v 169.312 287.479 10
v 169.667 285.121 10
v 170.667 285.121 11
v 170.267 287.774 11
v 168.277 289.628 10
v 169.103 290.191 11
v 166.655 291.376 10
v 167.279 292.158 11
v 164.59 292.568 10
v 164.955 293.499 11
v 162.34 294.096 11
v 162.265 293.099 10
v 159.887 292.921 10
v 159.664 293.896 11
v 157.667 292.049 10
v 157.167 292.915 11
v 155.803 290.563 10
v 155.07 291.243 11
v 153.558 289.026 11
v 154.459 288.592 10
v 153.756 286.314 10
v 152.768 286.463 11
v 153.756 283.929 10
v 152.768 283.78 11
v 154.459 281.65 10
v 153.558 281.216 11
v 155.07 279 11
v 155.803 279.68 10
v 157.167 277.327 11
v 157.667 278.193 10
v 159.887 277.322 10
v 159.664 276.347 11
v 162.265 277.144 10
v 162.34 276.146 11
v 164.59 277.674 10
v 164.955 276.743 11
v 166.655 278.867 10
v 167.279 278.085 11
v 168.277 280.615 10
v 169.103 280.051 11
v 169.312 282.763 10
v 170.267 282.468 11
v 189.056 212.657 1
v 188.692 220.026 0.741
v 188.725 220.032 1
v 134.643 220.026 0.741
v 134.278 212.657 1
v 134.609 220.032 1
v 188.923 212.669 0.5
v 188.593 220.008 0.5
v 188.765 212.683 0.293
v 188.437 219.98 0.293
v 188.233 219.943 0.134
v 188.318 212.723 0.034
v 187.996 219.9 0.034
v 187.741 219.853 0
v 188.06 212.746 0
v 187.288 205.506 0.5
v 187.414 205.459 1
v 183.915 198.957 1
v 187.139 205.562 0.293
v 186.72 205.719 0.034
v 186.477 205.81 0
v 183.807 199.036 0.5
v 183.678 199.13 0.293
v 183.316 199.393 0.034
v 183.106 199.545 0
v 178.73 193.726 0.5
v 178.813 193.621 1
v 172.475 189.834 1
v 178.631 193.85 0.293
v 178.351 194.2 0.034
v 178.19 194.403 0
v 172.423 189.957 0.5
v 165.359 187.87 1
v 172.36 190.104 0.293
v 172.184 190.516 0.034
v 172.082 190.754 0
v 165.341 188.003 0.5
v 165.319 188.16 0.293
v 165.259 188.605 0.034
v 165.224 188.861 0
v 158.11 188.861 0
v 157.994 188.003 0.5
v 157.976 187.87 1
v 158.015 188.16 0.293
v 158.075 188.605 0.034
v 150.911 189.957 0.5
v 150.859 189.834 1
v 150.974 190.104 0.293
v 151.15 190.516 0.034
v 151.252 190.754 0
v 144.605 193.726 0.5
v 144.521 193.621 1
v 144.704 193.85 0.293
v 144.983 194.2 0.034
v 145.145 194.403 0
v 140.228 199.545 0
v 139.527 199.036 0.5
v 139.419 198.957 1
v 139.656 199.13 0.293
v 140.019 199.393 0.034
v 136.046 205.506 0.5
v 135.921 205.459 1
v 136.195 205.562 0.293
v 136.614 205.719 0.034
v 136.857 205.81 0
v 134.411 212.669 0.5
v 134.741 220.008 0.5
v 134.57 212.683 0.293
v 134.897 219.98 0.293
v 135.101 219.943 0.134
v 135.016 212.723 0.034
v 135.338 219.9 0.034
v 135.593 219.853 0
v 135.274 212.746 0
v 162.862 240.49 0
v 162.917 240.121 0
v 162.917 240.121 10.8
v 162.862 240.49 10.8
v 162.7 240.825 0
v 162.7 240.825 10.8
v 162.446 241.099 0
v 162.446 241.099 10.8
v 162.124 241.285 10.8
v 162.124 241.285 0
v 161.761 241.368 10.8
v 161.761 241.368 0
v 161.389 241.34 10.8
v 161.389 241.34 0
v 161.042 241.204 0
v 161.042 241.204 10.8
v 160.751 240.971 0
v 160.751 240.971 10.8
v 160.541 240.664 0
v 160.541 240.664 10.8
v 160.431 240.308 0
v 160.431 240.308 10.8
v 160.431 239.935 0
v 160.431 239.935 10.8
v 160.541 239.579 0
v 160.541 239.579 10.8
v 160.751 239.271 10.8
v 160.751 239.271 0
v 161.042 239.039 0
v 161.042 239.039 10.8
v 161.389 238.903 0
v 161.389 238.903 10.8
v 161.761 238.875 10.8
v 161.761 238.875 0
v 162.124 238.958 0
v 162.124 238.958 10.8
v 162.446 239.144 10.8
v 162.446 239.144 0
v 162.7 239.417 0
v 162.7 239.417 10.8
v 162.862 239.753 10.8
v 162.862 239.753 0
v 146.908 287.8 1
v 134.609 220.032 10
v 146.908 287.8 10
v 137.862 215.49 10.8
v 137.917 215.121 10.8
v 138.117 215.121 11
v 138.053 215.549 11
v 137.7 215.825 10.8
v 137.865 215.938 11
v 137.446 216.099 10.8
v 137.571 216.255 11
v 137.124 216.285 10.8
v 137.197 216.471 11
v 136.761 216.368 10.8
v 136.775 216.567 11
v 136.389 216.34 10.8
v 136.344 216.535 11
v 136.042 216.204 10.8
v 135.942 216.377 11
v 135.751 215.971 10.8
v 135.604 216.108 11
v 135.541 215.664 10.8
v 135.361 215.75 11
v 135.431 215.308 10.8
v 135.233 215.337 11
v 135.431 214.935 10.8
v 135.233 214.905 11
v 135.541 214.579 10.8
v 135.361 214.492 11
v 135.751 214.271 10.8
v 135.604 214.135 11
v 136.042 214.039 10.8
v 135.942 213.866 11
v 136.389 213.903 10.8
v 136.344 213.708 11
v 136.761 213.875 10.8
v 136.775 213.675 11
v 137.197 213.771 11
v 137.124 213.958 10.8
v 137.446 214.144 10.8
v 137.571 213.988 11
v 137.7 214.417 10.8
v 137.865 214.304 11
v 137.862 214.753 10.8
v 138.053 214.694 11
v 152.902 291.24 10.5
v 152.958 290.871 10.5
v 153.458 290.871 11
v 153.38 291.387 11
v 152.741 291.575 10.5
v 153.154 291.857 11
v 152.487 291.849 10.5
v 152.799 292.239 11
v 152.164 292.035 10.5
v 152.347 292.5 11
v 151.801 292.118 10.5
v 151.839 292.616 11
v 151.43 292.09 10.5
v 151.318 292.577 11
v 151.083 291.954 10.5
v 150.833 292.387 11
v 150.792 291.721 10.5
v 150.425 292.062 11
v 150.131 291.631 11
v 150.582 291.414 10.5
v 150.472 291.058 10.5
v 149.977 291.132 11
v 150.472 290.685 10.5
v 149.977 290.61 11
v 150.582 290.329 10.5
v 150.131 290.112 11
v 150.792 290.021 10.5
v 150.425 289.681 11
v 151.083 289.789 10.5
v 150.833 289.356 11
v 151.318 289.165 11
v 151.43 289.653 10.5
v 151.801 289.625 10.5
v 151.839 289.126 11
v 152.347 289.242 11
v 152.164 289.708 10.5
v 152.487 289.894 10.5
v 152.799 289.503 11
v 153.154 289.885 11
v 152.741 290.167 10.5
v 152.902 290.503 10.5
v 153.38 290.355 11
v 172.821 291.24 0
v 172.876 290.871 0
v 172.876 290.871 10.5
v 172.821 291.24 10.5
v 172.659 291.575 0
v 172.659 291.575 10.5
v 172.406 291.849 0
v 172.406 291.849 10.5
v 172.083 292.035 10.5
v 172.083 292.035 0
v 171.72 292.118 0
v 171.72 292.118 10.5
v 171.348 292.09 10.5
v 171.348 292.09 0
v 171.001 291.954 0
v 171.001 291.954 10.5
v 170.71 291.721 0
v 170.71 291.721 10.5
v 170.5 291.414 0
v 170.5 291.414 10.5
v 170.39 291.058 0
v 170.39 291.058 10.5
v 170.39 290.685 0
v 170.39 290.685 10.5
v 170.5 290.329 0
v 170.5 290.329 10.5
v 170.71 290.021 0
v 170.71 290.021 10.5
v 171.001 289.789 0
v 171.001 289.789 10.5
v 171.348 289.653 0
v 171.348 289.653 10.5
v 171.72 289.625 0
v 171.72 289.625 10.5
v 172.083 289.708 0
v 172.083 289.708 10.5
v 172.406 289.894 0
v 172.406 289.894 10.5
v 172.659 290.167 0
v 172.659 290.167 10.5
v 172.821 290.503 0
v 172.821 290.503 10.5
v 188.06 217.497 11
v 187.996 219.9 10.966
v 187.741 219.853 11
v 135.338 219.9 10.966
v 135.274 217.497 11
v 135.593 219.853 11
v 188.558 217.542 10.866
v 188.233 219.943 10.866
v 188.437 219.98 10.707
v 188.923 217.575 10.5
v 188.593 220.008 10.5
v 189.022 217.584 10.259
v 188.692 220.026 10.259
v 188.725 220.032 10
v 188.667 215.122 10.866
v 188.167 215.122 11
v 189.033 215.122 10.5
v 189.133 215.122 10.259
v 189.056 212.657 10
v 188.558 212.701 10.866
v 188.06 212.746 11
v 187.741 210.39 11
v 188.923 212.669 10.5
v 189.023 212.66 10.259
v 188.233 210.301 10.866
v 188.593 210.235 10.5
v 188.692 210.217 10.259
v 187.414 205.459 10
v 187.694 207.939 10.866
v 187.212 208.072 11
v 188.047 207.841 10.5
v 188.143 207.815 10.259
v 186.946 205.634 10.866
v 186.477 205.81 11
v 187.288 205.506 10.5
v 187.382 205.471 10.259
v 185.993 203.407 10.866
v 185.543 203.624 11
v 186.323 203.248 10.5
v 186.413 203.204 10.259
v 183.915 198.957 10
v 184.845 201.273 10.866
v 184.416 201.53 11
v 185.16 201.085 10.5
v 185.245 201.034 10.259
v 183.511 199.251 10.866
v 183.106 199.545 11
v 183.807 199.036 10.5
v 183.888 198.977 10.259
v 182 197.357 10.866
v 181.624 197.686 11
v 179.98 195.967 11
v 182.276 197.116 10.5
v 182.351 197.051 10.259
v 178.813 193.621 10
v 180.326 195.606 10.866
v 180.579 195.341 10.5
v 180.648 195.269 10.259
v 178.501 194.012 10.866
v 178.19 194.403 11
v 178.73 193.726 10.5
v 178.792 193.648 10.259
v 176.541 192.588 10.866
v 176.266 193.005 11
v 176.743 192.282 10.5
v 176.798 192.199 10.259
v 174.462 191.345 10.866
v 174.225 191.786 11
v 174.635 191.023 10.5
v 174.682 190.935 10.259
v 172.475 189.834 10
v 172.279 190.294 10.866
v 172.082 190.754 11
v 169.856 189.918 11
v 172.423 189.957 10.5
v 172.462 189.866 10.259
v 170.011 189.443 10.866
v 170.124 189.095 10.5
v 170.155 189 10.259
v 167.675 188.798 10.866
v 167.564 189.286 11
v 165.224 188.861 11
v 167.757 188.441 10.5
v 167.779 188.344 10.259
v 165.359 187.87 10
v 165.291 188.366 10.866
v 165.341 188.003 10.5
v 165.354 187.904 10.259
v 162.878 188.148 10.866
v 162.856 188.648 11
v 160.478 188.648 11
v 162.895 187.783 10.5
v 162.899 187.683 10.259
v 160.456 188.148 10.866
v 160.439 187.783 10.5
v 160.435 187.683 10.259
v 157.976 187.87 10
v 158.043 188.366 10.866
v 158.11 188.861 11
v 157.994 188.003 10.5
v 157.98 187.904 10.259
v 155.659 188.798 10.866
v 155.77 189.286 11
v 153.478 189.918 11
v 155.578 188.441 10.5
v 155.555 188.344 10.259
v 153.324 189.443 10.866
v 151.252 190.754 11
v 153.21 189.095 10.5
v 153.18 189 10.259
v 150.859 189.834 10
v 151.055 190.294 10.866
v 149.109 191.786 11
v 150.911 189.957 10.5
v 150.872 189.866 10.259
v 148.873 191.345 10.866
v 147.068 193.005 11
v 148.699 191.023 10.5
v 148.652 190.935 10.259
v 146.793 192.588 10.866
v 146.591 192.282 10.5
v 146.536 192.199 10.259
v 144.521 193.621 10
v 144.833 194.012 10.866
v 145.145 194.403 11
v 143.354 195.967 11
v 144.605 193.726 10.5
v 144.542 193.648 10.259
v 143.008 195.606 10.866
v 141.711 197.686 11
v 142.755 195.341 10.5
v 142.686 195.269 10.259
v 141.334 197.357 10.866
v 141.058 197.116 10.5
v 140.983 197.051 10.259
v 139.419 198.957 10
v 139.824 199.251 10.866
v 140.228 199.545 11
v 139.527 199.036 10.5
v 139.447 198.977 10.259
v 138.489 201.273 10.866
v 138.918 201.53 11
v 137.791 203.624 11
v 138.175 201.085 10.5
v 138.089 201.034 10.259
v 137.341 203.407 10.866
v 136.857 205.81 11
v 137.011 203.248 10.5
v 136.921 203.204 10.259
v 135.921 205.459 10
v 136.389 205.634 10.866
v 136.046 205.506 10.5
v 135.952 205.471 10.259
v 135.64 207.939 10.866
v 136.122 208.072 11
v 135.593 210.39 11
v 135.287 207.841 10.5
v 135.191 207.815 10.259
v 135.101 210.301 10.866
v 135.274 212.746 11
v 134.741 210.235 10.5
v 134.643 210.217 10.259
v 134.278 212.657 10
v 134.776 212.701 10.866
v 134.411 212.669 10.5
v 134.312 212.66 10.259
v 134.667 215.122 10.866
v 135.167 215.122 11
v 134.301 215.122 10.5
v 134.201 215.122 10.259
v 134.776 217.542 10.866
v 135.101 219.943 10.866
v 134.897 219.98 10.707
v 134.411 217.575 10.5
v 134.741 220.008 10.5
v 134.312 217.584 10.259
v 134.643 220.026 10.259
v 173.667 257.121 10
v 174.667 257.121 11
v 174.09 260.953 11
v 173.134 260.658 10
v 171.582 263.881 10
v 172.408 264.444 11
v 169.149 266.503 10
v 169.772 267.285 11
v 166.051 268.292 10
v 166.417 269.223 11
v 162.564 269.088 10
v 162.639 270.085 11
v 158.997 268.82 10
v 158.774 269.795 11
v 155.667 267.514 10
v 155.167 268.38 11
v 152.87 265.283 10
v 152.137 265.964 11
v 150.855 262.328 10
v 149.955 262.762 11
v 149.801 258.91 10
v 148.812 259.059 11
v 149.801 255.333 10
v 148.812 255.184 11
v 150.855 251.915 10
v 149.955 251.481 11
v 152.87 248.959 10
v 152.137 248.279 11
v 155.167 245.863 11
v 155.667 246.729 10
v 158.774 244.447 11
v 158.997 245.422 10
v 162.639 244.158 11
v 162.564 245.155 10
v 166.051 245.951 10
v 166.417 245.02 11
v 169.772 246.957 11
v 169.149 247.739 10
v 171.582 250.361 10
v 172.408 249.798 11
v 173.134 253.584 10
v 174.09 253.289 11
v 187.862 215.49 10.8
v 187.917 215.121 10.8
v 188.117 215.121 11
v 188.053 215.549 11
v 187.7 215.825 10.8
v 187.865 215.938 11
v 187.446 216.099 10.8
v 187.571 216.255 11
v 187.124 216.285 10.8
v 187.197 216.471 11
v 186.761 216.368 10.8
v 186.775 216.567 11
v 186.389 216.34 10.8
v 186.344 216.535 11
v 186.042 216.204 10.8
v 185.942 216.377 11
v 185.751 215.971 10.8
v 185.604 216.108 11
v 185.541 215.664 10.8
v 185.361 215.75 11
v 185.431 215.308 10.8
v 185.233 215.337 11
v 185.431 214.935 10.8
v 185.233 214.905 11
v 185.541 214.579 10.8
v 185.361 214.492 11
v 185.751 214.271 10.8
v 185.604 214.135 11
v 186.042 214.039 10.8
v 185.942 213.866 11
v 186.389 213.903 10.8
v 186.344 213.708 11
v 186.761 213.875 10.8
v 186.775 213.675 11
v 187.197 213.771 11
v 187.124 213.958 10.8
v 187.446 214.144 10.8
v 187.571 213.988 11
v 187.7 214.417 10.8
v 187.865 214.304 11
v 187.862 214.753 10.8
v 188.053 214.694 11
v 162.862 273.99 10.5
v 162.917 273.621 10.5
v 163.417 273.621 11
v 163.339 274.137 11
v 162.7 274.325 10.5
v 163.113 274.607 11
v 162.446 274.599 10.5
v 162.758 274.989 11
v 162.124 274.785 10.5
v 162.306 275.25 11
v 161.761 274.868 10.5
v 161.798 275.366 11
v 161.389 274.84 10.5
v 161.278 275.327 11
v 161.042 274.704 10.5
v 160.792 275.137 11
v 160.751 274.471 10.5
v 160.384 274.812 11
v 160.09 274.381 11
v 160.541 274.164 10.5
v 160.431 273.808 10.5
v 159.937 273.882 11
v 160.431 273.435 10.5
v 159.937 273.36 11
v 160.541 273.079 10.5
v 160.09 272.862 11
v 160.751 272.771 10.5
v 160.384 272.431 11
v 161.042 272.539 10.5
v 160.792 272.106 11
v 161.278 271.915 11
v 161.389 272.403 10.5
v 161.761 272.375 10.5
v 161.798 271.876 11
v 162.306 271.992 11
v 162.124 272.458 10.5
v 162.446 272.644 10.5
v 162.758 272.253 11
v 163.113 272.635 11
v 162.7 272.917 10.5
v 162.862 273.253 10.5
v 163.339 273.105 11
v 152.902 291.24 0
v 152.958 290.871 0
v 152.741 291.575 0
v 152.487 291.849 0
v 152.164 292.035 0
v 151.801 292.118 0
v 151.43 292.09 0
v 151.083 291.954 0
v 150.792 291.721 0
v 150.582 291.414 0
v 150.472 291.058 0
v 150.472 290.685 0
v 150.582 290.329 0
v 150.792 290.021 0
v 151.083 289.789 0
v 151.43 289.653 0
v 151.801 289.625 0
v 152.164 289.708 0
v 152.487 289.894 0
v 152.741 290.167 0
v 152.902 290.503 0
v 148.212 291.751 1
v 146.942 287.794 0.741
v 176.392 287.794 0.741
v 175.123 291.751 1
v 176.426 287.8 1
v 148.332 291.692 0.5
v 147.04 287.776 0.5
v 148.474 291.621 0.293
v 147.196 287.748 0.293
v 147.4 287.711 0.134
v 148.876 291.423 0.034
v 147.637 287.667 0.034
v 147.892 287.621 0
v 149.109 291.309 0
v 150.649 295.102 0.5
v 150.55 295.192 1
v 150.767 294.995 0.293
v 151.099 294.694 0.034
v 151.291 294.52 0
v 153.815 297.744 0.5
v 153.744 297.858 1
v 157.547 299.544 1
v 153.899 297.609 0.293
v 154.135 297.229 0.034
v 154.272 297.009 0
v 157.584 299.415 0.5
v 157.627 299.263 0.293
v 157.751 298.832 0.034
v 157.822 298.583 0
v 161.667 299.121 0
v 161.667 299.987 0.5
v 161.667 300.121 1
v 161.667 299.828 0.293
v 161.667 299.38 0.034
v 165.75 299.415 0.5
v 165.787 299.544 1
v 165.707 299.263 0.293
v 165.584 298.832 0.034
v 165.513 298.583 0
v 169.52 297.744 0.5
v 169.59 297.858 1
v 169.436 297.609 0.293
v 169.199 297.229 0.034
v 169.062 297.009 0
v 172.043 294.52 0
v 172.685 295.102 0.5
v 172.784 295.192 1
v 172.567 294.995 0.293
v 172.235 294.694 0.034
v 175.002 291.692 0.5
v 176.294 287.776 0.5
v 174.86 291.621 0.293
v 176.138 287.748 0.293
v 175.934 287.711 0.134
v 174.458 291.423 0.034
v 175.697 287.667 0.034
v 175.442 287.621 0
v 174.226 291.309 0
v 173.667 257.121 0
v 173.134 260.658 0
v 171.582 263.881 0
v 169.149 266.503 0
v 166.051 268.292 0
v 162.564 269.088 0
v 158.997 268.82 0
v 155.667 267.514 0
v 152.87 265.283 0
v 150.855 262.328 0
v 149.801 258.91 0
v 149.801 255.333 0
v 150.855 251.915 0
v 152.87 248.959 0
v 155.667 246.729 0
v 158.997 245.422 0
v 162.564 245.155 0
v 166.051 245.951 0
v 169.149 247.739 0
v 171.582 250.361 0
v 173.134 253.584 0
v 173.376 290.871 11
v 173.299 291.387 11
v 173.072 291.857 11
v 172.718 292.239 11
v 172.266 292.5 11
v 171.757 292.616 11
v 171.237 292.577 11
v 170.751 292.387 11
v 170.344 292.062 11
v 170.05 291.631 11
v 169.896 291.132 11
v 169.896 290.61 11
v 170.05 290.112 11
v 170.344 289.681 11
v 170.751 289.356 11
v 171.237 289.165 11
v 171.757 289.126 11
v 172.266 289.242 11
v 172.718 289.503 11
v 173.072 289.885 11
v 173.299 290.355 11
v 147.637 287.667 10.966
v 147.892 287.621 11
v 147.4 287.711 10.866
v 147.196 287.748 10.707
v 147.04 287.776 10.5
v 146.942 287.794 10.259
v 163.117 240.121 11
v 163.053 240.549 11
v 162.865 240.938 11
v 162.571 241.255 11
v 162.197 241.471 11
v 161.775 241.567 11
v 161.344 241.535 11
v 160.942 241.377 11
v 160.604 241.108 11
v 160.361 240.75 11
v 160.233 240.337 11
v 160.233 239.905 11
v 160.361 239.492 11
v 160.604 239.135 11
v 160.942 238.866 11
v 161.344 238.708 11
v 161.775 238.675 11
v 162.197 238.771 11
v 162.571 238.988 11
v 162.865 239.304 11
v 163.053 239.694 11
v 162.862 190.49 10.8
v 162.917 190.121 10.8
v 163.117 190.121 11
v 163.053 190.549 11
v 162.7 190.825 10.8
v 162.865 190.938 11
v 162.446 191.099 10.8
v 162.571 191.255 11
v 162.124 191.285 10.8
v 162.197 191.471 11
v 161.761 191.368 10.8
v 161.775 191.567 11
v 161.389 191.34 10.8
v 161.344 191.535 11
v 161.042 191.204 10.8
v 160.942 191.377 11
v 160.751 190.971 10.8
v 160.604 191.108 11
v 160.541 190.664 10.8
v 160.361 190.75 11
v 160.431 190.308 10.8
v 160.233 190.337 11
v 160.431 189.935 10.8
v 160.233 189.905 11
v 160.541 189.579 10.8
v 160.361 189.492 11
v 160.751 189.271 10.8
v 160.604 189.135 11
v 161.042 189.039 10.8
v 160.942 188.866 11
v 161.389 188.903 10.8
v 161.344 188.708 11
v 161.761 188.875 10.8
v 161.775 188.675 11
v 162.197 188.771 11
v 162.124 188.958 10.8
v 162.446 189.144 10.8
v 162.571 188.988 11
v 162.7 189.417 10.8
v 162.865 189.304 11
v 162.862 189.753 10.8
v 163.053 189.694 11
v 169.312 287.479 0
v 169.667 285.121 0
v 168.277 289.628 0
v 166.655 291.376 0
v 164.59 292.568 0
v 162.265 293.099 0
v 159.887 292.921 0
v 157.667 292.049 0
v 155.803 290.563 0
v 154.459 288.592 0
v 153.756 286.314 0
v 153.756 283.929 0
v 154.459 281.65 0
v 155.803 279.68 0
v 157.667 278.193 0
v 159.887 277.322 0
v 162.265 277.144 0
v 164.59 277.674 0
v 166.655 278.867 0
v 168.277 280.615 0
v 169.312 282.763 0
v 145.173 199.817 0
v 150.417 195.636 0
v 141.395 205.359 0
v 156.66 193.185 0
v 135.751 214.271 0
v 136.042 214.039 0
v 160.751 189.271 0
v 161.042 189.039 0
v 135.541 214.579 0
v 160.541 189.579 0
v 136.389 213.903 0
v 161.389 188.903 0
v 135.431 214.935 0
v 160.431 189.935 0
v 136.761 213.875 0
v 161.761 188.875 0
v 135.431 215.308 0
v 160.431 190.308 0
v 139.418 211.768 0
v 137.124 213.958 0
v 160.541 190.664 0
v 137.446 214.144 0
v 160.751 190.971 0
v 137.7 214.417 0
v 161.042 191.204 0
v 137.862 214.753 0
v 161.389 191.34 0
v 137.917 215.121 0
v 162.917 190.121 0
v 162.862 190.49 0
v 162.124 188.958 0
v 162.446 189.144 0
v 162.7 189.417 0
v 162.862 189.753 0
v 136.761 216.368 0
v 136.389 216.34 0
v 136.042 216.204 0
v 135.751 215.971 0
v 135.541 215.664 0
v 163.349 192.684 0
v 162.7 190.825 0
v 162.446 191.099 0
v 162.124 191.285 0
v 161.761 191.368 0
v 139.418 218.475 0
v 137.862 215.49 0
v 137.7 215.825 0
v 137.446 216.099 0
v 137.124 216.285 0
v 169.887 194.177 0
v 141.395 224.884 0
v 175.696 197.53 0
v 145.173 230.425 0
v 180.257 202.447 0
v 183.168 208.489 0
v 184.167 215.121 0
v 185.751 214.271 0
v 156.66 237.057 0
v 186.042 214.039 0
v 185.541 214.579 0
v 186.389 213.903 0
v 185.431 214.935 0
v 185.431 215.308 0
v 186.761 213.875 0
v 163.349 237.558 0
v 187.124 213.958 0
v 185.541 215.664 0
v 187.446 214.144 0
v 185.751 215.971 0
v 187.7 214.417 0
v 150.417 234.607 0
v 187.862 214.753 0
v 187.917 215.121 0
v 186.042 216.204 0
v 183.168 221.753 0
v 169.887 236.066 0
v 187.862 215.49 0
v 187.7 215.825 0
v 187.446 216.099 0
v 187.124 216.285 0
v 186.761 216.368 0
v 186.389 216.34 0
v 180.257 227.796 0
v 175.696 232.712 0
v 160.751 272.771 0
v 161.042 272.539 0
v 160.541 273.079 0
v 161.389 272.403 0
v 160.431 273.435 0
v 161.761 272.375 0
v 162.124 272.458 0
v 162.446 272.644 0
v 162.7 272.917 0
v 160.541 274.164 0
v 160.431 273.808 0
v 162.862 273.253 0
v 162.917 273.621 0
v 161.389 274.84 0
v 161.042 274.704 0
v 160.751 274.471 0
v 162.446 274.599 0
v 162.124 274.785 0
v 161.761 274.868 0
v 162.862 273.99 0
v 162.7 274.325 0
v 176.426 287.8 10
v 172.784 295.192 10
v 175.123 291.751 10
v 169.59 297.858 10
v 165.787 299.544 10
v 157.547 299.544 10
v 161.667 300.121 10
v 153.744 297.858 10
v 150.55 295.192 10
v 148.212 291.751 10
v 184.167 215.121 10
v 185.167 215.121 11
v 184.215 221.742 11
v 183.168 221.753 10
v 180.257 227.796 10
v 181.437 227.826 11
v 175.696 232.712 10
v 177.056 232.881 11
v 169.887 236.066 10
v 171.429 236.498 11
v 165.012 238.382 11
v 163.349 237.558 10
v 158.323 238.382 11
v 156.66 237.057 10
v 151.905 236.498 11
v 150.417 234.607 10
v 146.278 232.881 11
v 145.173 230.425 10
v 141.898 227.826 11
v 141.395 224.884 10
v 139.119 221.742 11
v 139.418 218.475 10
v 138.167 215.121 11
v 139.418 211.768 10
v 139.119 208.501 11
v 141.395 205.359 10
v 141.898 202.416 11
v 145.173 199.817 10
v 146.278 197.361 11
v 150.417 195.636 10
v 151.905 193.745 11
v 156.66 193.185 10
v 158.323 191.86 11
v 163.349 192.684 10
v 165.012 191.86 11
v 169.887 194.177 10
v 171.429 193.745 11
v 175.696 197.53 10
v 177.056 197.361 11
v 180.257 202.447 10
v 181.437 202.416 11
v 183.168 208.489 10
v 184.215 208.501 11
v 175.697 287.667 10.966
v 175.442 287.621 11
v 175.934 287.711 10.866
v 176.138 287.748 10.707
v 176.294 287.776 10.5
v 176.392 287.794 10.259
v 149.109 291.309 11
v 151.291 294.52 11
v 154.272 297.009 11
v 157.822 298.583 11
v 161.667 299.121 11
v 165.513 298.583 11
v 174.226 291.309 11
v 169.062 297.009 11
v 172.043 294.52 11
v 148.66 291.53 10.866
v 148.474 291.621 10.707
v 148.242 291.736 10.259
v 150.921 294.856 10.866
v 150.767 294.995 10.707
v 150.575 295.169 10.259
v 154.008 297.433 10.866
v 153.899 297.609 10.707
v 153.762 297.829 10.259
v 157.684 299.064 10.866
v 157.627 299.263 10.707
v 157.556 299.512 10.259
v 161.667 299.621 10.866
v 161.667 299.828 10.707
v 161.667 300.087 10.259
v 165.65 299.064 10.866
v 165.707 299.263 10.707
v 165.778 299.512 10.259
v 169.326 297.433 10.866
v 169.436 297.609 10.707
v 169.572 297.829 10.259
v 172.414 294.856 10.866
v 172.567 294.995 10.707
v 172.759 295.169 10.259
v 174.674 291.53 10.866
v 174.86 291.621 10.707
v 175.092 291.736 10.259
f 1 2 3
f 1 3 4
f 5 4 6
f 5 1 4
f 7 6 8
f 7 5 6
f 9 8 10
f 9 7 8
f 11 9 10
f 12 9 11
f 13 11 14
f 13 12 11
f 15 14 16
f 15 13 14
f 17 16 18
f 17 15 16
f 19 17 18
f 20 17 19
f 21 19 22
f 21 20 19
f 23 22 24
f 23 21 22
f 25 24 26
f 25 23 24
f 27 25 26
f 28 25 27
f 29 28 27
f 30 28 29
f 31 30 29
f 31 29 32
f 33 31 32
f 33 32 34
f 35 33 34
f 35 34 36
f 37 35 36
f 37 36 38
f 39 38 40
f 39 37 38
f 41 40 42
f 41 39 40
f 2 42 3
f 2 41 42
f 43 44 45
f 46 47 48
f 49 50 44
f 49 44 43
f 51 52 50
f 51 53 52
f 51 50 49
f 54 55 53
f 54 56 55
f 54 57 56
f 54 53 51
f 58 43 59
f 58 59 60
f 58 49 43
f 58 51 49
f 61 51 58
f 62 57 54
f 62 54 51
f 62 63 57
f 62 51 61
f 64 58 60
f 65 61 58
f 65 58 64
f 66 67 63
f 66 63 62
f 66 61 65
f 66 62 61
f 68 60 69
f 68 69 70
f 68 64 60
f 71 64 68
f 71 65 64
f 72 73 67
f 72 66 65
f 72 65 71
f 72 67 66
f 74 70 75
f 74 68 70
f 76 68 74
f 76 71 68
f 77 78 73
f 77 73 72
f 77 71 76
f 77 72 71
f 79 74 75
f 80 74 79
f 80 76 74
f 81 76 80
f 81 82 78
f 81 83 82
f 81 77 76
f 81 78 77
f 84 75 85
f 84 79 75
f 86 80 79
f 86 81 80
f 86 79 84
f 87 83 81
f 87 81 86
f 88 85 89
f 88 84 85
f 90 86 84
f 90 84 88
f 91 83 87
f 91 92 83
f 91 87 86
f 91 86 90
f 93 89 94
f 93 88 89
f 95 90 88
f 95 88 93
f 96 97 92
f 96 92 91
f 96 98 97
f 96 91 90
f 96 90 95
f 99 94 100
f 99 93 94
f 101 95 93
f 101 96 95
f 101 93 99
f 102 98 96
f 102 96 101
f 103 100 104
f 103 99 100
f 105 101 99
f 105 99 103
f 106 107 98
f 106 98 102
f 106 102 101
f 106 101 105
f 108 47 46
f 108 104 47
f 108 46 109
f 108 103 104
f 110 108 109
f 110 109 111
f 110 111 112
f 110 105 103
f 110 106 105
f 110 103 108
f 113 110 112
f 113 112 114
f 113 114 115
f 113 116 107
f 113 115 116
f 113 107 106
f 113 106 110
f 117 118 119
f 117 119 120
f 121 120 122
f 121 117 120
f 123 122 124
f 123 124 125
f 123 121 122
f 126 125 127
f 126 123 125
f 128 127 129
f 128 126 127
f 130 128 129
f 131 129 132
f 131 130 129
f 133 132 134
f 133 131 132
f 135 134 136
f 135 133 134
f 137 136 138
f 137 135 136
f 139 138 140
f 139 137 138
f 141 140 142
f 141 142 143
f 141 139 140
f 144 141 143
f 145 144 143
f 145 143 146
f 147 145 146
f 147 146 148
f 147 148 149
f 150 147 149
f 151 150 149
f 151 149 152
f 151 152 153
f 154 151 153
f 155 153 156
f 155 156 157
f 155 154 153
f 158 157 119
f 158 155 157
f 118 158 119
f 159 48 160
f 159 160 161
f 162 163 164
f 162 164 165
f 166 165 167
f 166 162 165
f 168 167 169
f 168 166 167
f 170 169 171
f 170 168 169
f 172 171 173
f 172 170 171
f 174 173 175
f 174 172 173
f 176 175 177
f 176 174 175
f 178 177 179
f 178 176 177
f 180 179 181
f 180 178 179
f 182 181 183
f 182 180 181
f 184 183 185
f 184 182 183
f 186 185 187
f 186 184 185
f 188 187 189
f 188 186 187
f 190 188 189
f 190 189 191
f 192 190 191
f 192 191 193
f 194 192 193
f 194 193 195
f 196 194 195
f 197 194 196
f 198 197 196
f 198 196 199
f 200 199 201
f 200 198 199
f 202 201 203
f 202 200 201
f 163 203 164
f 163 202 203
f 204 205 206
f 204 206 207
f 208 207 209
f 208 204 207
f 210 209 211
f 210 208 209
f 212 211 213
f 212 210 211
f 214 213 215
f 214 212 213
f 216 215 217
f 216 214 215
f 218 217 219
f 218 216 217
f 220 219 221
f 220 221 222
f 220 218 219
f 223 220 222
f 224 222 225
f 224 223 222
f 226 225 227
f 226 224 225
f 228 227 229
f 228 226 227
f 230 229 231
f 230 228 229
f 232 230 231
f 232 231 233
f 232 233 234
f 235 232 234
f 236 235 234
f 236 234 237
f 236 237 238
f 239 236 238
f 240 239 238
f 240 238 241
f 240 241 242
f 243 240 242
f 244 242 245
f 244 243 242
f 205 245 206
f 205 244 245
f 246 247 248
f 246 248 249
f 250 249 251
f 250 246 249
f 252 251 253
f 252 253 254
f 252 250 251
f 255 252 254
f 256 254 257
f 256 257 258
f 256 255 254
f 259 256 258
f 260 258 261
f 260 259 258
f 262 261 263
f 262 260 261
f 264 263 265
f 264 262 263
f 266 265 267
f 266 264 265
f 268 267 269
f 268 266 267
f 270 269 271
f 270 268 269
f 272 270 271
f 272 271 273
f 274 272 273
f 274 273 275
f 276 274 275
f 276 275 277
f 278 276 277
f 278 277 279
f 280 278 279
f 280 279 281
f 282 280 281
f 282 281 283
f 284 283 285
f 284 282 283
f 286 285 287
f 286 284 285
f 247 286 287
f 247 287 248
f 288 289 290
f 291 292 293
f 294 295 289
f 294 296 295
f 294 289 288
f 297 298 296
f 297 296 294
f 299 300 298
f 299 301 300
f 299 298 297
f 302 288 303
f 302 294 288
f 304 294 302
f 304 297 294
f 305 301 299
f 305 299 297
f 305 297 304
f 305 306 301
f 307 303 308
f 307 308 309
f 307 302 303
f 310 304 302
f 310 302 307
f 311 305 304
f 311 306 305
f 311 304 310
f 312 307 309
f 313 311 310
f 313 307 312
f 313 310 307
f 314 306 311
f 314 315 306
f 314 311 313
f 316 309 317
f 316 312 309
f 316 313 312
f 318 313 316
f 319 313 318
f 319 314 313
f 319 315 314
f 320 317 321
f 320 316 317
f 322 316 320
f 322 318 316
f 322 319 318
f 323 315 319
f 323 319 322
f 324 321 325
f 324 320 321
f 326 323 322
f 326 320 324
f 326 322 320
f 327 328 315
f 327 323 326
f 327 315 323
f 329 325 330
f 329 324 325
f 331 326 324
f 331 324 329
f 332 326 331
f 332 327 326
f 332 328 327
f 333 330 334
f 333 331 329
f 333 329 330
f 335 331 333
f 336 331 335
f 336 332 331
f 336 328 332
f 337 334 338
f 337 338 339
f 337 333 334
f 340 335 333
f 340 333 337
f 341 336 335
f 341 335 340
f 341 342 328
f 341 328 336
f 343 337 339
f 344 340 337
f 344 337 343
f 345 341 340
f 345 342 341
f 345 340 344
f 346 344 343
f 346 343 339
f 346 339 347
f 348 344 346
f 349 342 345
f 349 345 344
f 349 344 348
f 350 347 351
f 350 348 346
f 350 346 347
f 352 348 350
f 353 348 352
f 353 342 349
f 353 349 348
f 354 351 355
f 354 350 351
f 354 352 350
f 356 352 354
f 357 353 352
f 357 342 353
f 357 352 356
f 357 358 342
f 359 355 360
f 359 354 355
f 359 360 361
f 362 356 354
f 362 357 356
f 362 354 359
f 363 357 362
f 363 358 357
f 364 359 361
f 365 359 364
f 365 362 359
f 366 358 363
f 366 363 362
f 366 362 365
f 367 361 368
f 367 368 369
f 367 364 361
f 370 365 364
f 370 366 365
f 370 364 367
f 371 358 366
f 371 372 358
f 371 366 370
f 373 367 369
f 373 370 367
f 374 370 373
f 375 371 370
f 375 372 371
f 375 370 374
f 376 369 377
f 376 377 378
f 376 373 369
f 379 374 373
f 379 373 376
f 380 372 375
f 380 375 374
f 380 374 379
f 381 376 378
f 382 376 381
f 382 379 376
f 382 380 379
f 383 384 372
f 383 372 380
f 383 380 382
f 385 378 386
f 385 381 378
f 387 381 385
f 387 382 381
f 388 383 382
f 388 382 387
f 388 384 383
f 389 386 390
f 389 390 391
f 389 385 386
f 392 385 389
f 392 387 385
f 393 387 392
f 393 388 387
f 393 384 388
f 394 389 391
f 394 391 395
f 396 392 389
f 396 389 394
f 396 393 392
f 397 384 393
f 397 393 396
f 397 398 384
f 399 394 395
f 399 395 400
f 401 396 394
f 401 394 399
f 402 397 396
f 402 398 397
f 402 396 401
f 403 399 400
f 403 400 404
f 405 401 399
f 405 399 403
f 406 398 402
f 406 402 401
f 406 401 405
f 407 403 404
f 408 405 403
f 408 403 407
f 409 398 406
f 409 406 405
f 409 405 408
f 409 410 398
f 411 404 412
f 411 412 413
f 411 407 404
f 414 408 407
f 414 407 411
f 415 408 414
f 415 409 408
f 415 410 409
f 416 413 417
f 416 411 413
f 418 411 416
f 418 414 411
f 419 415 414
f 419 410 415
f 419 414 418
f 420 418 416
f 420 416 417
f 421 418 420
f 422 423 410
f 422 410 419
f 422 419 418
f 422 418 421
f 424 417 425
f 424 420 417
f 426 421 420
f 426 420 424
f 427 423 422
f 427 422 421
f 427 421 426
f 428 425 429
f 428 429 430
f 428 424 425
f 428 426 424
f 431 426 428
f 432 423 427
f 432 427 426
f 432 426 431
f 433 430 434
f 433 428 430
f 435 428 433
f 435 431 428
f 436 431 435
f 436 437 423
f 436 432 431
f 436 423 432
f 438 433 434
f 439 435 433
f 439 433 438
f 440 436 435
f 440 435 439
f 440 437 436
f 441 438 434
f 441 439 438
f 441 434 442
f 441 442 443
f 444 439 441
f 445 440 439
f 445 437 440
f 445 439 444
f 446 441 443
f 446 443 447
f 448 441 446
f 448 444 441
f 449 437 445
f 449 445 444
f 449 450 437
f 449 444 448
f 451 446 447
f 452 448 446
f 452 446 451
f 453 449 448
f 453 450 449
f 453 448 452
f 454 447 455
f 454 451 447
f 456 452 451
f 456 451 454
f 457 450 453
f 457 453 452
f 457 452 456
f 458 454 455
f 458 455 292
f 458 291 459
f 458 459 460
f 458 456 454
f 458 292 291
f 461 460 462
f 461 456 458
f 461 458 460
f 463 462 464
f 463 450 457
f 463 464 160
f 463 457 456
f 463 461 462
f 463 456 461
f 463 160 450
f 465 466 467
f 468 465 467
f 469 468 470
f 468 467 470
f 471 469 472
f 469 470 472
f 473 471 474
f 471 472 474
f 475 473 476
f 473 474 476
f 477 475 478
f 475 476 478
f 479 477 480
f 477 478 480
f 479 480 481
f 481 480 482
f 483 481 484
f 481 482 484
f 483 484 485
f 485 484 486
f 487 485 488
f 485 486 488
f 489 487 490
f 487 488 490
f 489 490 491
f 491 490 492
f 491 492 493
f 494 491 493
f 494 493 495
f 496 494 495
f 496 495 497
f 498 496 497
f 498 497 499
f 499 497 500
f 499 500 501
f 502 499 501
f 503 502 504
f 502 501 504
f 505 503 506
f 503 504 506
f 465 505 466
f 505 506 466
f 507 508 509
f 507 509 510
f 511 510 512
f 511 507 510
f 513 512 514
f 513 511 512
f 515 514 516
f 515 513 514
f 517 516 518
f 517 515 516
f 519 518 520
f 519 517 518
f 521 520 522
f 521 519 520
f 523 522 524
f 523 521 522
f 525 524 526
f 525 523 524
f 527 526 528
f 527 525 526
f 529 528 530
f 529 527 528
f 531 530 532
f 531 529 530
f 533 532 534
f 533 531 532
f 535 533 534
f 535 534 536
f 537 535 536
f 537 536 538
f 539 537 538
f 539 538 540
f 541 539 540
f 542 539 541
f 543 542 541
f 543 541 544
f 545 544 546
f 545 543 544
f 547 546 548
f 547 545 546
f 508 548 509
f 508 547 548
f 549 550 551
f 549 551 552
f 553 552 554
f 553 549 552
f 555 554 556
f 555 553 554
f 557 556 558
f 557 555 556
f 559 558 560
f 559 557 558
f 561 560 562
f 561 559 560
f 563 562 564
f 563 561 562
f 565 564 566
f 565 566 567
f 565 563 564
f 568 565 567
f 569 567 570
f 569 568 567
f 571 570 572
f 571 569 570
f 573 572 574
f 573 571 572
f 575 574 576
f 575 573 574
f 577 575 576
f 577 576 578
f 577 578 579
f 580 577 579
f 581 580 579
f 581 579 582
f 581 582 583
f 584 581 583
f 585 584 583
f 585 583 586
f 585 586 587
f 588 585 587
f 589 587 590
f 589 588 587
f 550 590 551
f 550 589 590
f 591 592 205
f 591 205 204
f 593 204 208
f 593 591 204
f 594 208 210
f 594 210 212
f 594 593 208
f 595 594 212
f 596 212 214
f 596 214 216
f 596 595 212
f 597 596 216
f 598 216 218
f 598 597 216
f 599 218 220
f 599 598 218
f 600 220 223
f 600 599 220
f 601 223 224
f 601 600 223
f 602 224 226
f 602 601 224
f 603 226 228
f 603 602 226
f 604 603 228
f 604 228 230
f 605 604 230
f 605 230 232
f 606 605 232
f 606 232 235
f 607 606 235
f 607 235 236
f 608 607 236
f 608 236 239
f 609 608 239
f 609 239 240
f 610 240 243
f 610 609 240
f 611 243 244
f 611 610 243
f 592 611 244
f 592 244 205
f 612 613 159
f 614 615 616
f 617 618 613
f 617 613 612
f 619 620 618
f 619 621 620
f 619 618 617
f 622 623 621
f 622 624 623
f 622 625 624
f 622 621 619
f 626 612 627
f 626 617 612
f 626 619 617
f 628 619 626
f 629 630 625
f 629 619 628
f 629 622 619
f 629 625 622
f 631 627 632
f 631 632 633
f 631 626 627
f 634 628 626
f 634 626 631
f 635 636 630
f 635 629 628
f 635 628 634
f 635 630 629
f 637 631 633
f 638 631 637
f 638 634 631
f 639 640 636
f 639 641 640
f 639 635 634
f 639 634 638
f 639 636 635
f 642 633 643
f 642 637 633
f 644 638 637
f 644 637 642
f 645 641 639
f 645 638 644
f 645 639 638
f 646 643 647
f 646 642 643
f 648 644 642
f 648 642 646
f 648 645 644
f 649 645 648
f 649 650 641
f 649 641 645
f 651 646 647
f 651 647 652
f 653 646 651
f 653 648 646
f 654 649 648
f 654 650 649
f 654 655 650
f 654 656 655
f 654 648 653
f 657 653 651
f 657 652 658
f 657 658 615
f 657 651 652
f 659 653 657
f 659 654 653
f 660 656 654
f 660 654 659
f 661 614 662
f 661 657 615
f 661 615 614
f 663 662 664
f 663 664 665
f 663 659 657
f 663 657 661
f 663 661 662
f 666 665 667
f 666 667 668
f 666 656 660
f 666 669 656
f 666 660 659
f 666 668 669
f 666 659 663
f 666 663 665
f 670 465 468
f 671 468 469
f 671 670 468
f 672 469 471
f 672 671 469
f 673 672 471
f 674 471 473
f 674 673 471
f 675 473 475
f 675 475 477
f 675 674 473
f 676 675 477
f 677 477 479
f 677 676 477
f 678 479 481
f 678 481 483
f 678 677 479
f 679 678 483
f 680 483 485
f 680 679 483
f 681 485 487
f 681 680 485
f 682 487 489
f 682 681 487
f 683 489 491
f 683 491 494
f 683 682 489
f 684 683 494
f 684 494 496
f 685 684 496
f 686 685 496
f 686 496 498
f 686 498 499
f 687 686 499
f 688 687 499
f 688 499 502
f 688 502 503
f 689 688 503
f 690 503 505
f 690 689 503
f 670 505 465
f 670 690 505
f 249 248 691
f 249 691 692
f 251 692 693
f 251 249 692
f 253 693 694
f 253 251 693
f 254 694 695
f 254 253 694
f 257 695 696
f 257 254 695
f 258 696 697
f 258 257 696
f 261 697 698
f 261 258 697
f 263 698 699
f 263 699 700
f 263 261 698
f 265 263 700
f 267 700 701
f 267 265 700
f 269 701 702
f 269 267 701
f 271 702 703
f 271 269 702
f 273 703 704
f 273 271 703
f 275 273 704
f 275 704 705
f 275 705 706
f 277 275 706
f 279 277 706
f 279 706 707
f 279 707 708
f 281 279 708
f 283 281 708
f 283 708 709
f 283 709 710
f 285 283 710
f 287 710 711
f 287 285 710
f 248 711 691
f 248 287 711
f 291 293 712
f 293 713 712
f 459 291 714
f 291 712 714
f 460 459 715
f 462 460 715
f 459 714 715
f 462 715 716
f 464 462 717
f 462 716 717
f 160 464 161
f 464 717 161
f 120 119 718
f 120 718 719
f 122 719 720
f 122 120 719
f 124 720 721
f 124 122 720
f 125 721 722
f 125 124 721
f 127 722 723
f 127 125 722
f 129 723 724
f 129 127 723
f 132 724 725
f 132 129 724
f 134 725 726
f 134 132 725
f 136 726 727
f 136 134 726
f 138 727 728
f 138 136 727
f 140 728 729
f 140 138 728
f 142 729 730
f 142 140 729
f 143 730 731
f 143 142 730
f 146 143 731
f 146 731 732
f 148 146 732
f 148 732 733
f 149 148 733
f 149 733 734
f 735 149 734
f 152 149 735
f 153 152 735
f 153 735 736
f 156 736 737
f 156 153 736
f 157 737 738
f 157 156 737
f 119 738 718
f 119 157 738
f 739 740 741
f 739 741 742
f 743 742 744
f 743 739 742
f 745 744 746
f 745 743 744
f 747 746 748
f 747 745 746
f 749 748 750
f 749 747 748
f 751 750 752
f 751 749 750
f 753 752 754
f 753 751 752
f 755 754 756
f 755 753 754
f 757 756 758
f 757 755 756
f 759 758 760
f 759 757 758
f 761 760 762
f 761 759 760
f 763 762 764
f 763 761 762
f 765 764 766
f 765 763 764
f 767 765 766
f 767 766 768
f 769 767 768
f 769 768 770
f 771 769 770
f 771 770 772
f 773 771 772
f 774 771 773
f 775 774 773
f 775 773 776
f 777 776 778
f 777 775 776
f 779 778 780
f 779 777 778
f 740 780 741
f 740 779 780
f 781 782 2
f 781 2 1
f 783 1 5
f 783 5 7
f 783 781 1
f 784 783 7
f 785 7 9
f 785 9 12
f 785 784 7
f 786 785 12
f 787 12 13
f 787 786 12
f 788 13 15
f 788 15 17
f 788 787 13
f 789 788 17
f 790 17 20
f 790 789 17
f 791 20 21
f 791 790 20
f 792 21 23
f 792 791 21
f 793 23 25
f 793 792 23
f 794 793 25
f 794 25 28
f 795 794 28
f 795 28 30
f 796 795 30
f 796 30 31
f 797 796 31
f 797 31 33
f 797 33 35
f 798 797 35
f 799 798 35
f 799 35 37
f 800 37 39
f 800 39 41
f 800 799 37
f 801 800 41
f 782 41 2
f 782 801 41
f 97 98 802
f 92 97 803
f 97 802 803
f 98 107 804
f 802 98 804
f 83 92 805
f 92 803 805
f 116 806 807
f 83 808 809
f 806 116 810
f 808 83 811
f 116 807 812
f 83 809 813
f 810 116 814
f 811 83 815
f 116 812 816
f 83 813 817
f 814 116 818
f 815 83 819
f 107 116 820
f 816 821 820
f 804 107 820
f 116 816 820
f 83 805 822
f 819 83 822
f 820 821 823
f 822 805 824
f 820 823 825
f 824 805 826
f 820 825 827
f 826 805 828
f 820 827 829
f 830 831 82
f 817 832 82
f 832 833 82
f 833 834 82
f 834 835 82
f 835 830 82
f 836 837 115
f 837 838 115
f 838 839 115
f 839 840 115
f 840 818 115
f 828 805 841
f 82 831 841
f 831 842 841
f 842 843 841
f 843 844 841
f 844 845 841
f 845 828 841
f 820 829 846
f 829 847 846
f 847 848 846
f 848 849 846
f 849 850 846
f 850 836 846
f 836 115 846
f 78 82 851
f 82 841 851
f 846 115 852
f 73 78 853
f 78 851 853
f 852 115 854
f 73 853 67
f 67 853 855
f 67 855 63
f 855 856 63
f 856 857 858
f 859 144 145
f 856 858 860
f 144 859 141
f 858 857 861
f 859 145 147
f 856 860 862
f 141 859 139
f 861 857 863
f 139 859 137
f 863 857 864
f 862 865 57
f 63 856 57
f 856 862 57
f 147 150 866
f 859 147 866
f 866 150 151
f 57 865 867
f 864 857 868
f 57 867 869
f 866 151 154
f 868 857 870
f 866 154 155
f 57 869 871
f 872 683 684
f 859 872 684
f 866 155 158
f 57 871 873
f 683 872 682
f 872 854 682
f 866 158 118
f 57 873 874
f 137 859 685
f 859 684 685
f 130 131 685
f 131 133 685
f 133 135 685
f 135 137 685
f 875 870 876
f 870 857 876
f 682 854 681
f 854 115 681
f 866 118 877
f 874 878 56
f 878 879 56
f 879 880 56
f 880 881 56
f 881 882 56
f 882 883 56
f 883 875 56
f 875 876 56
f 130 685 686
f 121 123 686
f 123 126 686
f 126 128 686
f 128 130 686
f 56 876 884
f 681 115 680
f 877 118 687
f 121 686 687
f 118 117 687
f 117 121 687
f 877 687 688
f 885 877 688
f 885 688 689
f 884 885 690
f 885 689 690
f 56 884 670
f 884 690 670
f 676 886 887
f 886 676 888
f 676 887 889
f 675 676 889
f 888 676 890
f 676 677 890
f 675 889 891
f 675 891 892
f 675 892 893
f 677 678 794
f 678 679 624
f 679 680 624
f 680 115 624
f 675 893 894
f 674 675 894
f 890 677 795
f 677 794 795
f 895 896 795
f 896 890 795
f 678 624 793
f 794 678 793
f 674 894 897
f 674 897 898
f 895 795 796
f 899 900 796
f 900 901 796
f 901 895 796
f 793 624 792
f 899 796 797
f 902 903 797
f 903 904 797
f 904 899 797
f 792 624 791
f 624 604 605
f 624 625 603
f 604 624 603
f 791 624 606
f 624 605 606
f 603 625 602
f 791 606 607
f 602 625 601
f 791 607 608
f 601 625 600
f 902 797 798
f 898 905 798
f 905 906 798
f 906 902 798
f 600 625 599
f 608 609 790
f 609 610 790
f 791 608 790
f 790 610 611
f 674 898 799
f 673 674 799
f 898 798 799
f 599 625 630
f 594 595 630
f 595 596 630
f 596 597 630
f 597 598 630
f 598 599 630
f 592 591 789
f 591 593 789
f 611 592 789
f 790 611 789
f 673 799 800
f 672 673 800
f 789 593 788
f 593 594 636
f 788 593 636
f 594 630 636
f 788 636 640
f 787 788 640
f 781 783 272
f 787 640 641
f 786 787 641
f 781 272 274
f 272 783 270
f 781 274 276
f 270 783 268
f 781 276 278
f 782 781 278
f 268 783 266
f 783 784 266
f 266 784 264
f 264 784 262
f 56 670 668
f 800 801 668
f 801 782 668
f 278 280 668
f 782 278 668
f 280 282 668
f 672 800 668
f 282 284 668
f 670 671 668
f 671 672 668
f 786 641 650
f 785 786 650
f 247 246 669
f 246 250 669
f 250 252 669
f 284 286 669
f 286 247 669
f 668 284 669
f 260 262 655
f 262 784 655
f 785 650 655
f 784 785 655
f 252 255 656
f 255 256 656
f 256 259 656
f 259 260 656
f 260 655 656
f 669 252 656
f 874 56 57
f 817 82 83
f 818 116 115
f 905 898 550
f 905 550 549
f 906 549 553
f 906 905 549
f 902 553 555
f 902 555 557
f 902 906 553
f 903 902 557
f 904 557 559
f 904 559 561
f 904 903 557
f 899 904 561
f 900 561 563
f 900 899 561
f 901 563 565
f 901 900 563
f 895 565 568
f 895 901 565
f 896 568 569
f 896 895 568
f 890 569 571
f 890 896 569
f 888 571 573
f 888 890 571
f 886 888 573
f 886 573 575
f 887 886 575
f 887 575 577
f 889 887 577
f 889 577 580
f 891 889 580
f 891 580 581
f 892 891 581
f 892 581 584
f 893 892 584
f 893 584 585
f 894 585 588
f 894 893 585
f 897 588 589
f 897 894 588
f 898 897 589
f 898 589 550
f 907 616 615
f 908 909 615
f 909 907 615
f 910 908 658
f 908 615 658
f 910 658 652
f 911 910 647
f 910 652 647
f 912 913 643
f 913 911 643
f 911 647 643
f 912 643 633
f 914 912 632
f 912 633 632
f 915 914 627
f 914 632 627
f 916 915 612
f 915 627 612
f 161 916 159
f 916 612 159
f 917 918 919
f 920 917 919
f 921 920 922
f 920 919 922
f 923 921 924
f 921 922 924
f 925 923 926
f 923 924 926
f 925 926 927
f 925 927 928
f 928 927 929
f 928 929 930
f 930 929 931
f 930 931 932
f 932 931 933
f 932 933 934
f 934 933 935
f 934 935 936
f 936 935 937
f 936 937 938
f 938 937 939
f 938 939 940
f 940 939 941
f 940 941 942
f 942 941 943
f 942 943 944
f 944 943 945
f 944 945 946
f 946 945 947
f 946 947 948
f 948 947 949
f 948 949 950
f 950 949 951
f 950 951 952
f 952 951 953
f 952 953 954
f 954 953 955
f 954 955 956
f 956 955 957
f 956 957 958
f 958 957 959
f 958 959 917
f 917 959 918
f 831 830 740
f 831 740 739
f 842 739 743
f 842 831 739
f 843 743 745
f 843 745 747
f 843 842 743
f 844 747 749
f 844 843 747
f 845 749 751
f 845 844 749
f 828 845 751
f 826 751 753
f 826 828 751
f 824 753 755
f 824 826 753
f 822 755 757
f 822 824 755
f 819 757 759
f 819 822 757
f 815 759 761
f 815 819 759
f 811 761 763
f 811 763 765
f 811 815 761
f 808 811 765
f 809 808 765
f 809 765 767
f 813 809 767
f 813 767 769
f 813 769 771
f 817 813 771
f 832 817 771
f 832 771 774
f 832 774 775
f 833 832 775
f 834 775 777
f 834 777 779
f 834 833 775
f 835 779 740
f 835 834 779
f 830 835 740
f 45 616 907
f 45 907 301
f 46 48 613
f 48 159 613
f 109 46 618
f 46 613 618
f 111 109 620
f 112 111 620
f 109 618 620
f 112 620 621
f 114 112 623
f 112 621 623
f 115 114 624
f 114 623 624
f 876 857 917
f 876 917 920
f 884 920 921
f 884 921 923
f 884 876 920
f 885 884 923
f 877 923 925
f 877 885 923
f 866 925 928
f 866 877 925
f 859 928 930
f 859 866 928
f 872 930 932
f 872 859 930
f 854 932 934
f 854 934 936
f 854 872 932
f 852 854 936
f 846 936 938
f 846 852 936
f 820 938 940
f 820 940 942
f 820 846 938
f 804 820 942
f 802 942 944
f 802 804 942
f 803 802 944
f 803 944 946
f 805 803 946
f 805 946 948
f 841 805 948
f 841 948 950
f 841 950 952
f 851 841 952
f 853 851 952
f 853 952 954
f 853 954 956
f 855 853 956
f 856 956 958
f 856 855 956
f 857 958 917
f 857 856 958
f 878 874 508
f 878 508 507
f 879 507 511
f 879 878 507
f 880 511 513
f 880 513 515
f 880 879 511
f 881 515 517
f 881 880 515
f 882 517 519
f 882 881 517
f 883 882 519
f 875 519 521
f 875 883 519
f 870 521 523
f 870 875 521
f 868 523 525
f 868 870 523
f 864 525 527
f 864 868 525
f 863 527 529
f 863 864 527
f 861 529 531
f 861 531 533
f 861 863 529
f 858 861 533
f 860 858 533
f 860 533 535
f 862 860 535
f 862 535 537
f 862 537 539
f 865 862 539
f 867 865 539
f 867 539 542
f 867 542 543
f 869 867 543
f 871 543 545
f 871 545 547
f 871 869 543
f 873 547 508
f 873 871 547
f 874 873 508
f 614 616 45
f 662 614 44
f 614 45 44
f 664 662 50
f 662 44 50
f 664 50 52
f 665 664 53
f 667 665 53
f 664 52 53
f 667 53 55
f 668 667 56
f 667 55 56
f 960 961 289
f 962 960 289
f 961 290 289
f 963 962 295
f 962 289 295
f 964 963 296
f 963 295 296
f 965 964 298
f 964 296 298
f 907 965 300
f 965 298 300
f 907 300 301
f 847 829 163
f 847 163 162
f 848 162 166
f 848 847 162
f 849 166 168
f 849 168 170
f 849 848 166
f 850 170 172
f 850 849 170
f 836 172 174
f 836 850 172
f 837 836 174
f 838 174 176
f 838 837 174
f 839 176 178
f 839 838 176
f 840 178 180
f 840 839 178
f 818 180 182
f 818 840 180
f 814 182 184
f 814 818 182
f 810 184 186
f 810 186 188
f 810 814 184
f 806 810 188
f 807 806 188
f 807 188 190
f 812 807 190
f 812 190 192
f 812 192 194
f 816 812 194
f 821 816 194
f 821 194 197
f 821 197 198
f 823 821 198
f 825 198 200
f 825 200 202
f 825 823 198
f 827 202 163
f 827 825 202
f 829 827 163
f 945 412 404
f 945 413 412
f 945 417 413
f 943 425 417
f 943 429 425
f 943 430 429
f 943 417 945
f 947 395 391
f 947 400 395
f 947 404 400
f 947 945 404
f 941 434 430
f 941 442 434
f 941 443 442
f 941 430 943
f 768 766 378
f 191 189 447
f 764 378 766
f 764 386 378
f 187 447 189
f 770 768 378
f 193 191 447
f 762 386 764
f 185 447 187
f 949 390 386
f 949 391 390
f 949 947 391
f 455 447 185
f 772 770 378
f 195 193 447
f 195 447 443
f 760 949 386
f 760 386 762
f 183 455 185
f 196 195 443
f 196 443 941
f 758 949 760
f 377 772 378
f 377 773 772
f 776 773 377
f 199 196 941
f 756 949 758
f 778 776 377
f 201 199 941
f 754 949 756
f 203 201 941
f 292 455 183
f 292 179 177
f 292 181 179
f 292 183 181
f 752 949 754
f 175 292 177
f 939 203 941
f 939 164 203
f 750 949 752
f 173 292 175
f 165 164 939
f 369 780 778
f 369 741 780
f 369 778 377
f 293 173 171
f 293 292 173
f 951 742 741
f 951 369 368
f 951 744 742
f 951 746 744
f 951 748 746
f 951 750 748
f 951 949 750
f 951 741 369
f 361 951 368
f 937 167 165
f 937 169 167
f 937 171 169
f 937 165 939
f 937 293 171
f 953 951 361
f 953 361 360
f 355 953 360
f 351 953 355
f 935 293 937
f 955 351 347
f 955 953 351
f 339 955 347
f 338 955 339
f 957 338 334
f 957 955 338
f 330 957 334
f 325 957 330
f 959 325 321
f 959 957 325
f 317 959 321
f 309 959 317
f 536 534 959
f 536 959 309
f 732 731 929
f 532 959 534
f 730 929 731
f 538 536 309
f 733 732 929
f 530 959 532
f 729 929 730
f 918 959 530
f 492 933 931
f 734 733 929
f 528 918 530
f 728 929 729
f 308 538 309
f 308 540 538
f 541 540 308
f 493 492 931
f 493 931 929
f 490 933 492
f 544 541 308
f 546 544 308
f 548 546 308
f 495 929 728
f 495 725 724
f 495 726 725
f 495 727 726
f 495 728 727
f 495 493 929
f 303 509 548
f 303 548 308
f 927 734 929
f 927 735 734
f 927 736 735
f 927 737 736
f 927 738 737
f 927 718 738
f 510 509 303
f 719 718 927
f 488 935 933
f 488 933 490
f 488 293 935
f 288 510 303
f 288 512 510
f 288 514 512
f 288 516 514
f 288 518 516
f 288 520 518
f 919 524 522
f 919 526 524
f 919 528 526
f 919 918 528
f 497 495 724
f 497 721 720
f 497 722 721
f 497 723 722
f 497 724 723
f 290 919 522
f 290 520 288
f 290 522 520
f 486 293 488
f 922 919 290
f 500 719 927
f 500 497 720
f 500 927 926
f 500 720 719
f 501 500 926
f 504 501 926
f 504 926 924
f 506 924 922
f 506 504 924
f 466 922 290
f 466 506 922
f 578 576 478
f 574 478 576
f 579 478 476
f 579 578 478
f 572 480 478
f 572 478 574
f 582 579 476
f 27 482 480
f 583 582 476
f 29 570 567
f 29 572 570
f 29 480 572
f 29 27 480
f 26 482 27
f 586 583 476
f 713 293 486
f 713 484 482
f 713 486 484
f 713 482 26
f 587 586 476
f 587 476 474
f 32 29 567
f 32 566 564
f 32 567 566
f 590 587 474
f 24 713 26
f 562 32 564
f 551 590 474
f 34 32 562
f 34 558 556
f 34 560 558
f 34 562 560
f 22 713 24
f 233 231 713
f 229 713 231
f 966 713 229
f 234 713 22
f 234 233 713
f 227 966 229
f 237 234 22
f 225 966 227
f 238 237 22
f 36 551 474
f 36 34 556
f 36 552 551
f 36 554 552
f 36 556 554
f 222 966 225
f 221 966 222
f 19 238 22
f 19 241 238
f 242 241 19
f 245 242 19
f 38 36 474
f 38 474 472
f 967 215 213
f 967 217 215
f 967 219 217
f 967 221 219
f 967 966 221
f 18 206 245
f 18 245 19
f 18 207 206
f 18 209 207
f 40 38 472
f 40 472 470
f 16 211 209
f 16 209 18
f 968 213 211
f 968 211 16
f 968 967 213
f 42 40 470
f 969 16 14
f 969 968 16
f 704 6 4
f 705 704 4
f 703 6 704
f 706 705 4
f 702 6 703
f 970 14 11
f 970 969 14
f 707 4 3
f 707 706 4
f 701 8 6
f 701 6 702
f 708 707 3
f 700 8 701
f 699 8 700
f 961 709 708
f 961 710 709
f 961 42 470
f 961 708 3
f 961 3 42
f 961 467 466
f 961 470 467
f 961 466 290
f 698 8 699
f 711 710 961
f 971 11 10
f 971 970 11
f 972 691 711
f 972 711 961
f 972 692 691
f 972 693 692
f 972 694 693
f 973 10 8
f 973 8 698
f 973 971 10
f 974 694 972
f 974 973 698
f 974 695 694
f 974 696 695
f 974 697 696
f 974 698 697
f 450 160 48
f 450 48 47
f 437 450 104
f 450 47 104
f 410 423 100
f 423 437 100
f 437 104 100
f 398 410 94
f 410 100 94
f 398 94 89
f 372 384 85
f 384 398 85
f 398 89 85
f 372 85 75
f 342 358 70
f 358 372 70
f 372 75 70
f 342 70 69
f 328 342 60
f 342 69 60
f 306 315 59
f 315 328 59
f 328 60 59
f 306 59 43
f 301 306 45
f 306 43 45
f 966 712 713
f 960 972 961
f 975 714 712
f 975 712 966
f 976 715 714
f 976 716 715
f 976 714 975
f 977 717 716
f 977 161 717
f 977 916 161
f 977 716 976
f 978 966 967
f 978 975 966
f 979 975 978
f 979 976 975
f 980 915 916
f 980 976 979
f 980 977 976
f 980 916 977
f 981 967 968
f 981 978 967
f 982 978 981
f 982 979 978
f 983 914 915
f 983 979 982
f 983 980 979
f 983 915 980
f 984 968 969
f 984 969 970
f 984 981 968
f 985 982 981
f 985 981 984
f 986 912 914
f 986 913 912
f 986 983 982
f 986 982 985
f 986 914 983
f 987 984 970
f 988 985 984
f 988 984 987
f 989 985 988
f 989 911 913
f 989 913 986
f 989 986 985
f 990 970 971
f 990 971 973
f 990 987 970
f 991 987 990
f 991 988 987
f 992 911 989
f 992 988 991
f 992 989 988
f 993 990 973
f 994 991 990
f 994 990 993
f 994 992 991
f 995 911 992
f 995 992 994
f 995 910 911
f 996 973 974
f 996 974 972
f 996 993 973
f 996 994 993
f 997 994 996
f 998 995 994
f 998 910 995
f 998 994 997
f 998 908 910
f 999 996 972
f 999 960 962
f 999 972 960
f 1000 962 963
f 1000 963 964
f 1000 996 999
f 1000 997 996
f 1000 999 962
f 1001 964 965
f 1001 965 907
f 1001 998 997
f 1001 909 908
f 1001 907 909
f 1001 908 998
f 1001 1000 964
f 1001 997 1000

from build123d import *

# Parameters (mm, degrees)
SKETCH001_R     = 22.5
SKETCH001_R_2   = 8
SKETCH001_R_3   = 1.25
SKETCH001_R_4   = 12
PAD_DEPTH       = 11
CHAMFER_SIZE    = 1
CHAMFER001_SIZE = 1
FILLET_R        = 1
FILLET001_R     = 1
CHAMFER002_SIZE = 0.5
CHAMFER003_SIZE = 0.2
CHAMFER004_SIZE = 0.2


with BuildPart() as part:
    # Sketch001 → Pad (new body)
    with BuildSketch(Plane.XY):
        with BuildLine():
            ThreePointArc((176.426018, 287.799835), (161.667114, 300.121263), (146.90821, 287.799835))
            Line((134.609123, 220.031978), (146.90821, 287.799835))
            ThreePointArc((134.609123, 220.031978), (161.667114, 187.621263), (188.725105, 220.031978))
            Line((176.426018, 287.799835), (188.725105, 220.031978))
        make_face()
        with Locations((161.667114, 215.121263)):
            Circle(SKETCH001_R, mode=Mode.SUBTRACT)
        with Locations((161.667114, 285.121263)):
            Circle(SKETCH001_R_2, mode=Mode.SUBTRACT)
        with Locations((171.626406, 290.871263)):
            Circle(SKETCH001_R_3, mode=Mode.SUBTRACT)
        with Locations((161.667114, 273.621263)):
            Circle(SKETCH001_R_3, mode=Mode.SUBTRACT)
        with Locations((151.707822, 290.871263)):
            Circle(SKETCH001_R_3, mode=Mode.SUBTRACT)
        with Locations((161.667114, 240.121263)):
            Circle(SKETCH001_R_3, mode=Mode.SUBTRACT)
        with Locations((186.667114, 215.121263)):
            Circle(SKETCH001_R_3, mode=Mode.SUBTRACT)
        with Locations((161.667114, 190.121263)):
            Circle(SKETCH001_R_3, mode=Mode.SUBTRACT)
        with Locations((136.667114, 215.121263)):
            Circle(SKETCH001_R_3, mode=Mode.SUBTRACT)
        with Locations((161.667114, 257.121263)):
            Circle(SKETCH001_R_4, mode=Mode.SUBTRACT)
    extrude(amount=PAD_DEPTH)

    # Chamfer
    chamfer_edges = [part.edges().sort_by_distance(p)[0] for p in [
        (139.167114, 215.121263, 11),
        (149.667114, 257.121263, 11),
    ]]
    chamfer(chamfer_edges, length=CHAMFER_SIZE)

    # Chamfer001
    chamfer001_edges = [part.edges().sort_by_distance(p)[0] for p in [
        (153.667114, 285.121263, 11),
    ]]
    chamfer(chamfer001_edges, length=CHAMFER001_SIZE)

    # Fillet
    fillet_edges = [part.edges().sort_by_distance(p)[0] for p in [
        (140.758666, 253.915906, 11),
        (161.667114, 300.121263, 11),
        (182.575562, 253.915906, 11),
        (161.667114, 187.621263, 11),
    ]]
    fillet(fillet_edges, radius=FILLET_R)

    # Fillet001
    fillet001_edges = [part.edges().sort_by_distance(p)[0] for p in [
        (140.758666, 253.915906, 0),
        (161.667114, 300.121263, 0),
        (182.575562, 253.915906, 0),
        (161.667114, 187.621263, 0),
    ]]
    fillet(fillet001_edges, radius=FILLET001_R)

    # Chamfer002
    chamfer002_edges = [part.edges().sort_by_distance(p)[0] for p in [
        (170.376406, 290.871263, 11),
        (160.417114, 273.621263, 11),
        (150.457822, 290.871263, 11),
    ]]
    chamfer(chamfer002_edges, length=CHAMFER002_SIZE)

    # Chamfer003
    chamfer003_edges = [part.edges().sort_by_distance(p)[0] for p in [
        (160.417114, 240.121263, 11),
    ]]
    chamfer(chamfer003_edges, length=CHAMFER003_SIZE)

    # Chamfer004
    chamfer004_edges = [part.edges().sort_by_distance(p)[0] for p in [
        (185.417114, 215.121263, 11),
        (160.417114, 190.121263, 11),
        (135.417114, 215.121263, 11),
    ]]
    chamfer(chamfer004_edges, length=CHAMFER004_SIZE)


solid = part.part
